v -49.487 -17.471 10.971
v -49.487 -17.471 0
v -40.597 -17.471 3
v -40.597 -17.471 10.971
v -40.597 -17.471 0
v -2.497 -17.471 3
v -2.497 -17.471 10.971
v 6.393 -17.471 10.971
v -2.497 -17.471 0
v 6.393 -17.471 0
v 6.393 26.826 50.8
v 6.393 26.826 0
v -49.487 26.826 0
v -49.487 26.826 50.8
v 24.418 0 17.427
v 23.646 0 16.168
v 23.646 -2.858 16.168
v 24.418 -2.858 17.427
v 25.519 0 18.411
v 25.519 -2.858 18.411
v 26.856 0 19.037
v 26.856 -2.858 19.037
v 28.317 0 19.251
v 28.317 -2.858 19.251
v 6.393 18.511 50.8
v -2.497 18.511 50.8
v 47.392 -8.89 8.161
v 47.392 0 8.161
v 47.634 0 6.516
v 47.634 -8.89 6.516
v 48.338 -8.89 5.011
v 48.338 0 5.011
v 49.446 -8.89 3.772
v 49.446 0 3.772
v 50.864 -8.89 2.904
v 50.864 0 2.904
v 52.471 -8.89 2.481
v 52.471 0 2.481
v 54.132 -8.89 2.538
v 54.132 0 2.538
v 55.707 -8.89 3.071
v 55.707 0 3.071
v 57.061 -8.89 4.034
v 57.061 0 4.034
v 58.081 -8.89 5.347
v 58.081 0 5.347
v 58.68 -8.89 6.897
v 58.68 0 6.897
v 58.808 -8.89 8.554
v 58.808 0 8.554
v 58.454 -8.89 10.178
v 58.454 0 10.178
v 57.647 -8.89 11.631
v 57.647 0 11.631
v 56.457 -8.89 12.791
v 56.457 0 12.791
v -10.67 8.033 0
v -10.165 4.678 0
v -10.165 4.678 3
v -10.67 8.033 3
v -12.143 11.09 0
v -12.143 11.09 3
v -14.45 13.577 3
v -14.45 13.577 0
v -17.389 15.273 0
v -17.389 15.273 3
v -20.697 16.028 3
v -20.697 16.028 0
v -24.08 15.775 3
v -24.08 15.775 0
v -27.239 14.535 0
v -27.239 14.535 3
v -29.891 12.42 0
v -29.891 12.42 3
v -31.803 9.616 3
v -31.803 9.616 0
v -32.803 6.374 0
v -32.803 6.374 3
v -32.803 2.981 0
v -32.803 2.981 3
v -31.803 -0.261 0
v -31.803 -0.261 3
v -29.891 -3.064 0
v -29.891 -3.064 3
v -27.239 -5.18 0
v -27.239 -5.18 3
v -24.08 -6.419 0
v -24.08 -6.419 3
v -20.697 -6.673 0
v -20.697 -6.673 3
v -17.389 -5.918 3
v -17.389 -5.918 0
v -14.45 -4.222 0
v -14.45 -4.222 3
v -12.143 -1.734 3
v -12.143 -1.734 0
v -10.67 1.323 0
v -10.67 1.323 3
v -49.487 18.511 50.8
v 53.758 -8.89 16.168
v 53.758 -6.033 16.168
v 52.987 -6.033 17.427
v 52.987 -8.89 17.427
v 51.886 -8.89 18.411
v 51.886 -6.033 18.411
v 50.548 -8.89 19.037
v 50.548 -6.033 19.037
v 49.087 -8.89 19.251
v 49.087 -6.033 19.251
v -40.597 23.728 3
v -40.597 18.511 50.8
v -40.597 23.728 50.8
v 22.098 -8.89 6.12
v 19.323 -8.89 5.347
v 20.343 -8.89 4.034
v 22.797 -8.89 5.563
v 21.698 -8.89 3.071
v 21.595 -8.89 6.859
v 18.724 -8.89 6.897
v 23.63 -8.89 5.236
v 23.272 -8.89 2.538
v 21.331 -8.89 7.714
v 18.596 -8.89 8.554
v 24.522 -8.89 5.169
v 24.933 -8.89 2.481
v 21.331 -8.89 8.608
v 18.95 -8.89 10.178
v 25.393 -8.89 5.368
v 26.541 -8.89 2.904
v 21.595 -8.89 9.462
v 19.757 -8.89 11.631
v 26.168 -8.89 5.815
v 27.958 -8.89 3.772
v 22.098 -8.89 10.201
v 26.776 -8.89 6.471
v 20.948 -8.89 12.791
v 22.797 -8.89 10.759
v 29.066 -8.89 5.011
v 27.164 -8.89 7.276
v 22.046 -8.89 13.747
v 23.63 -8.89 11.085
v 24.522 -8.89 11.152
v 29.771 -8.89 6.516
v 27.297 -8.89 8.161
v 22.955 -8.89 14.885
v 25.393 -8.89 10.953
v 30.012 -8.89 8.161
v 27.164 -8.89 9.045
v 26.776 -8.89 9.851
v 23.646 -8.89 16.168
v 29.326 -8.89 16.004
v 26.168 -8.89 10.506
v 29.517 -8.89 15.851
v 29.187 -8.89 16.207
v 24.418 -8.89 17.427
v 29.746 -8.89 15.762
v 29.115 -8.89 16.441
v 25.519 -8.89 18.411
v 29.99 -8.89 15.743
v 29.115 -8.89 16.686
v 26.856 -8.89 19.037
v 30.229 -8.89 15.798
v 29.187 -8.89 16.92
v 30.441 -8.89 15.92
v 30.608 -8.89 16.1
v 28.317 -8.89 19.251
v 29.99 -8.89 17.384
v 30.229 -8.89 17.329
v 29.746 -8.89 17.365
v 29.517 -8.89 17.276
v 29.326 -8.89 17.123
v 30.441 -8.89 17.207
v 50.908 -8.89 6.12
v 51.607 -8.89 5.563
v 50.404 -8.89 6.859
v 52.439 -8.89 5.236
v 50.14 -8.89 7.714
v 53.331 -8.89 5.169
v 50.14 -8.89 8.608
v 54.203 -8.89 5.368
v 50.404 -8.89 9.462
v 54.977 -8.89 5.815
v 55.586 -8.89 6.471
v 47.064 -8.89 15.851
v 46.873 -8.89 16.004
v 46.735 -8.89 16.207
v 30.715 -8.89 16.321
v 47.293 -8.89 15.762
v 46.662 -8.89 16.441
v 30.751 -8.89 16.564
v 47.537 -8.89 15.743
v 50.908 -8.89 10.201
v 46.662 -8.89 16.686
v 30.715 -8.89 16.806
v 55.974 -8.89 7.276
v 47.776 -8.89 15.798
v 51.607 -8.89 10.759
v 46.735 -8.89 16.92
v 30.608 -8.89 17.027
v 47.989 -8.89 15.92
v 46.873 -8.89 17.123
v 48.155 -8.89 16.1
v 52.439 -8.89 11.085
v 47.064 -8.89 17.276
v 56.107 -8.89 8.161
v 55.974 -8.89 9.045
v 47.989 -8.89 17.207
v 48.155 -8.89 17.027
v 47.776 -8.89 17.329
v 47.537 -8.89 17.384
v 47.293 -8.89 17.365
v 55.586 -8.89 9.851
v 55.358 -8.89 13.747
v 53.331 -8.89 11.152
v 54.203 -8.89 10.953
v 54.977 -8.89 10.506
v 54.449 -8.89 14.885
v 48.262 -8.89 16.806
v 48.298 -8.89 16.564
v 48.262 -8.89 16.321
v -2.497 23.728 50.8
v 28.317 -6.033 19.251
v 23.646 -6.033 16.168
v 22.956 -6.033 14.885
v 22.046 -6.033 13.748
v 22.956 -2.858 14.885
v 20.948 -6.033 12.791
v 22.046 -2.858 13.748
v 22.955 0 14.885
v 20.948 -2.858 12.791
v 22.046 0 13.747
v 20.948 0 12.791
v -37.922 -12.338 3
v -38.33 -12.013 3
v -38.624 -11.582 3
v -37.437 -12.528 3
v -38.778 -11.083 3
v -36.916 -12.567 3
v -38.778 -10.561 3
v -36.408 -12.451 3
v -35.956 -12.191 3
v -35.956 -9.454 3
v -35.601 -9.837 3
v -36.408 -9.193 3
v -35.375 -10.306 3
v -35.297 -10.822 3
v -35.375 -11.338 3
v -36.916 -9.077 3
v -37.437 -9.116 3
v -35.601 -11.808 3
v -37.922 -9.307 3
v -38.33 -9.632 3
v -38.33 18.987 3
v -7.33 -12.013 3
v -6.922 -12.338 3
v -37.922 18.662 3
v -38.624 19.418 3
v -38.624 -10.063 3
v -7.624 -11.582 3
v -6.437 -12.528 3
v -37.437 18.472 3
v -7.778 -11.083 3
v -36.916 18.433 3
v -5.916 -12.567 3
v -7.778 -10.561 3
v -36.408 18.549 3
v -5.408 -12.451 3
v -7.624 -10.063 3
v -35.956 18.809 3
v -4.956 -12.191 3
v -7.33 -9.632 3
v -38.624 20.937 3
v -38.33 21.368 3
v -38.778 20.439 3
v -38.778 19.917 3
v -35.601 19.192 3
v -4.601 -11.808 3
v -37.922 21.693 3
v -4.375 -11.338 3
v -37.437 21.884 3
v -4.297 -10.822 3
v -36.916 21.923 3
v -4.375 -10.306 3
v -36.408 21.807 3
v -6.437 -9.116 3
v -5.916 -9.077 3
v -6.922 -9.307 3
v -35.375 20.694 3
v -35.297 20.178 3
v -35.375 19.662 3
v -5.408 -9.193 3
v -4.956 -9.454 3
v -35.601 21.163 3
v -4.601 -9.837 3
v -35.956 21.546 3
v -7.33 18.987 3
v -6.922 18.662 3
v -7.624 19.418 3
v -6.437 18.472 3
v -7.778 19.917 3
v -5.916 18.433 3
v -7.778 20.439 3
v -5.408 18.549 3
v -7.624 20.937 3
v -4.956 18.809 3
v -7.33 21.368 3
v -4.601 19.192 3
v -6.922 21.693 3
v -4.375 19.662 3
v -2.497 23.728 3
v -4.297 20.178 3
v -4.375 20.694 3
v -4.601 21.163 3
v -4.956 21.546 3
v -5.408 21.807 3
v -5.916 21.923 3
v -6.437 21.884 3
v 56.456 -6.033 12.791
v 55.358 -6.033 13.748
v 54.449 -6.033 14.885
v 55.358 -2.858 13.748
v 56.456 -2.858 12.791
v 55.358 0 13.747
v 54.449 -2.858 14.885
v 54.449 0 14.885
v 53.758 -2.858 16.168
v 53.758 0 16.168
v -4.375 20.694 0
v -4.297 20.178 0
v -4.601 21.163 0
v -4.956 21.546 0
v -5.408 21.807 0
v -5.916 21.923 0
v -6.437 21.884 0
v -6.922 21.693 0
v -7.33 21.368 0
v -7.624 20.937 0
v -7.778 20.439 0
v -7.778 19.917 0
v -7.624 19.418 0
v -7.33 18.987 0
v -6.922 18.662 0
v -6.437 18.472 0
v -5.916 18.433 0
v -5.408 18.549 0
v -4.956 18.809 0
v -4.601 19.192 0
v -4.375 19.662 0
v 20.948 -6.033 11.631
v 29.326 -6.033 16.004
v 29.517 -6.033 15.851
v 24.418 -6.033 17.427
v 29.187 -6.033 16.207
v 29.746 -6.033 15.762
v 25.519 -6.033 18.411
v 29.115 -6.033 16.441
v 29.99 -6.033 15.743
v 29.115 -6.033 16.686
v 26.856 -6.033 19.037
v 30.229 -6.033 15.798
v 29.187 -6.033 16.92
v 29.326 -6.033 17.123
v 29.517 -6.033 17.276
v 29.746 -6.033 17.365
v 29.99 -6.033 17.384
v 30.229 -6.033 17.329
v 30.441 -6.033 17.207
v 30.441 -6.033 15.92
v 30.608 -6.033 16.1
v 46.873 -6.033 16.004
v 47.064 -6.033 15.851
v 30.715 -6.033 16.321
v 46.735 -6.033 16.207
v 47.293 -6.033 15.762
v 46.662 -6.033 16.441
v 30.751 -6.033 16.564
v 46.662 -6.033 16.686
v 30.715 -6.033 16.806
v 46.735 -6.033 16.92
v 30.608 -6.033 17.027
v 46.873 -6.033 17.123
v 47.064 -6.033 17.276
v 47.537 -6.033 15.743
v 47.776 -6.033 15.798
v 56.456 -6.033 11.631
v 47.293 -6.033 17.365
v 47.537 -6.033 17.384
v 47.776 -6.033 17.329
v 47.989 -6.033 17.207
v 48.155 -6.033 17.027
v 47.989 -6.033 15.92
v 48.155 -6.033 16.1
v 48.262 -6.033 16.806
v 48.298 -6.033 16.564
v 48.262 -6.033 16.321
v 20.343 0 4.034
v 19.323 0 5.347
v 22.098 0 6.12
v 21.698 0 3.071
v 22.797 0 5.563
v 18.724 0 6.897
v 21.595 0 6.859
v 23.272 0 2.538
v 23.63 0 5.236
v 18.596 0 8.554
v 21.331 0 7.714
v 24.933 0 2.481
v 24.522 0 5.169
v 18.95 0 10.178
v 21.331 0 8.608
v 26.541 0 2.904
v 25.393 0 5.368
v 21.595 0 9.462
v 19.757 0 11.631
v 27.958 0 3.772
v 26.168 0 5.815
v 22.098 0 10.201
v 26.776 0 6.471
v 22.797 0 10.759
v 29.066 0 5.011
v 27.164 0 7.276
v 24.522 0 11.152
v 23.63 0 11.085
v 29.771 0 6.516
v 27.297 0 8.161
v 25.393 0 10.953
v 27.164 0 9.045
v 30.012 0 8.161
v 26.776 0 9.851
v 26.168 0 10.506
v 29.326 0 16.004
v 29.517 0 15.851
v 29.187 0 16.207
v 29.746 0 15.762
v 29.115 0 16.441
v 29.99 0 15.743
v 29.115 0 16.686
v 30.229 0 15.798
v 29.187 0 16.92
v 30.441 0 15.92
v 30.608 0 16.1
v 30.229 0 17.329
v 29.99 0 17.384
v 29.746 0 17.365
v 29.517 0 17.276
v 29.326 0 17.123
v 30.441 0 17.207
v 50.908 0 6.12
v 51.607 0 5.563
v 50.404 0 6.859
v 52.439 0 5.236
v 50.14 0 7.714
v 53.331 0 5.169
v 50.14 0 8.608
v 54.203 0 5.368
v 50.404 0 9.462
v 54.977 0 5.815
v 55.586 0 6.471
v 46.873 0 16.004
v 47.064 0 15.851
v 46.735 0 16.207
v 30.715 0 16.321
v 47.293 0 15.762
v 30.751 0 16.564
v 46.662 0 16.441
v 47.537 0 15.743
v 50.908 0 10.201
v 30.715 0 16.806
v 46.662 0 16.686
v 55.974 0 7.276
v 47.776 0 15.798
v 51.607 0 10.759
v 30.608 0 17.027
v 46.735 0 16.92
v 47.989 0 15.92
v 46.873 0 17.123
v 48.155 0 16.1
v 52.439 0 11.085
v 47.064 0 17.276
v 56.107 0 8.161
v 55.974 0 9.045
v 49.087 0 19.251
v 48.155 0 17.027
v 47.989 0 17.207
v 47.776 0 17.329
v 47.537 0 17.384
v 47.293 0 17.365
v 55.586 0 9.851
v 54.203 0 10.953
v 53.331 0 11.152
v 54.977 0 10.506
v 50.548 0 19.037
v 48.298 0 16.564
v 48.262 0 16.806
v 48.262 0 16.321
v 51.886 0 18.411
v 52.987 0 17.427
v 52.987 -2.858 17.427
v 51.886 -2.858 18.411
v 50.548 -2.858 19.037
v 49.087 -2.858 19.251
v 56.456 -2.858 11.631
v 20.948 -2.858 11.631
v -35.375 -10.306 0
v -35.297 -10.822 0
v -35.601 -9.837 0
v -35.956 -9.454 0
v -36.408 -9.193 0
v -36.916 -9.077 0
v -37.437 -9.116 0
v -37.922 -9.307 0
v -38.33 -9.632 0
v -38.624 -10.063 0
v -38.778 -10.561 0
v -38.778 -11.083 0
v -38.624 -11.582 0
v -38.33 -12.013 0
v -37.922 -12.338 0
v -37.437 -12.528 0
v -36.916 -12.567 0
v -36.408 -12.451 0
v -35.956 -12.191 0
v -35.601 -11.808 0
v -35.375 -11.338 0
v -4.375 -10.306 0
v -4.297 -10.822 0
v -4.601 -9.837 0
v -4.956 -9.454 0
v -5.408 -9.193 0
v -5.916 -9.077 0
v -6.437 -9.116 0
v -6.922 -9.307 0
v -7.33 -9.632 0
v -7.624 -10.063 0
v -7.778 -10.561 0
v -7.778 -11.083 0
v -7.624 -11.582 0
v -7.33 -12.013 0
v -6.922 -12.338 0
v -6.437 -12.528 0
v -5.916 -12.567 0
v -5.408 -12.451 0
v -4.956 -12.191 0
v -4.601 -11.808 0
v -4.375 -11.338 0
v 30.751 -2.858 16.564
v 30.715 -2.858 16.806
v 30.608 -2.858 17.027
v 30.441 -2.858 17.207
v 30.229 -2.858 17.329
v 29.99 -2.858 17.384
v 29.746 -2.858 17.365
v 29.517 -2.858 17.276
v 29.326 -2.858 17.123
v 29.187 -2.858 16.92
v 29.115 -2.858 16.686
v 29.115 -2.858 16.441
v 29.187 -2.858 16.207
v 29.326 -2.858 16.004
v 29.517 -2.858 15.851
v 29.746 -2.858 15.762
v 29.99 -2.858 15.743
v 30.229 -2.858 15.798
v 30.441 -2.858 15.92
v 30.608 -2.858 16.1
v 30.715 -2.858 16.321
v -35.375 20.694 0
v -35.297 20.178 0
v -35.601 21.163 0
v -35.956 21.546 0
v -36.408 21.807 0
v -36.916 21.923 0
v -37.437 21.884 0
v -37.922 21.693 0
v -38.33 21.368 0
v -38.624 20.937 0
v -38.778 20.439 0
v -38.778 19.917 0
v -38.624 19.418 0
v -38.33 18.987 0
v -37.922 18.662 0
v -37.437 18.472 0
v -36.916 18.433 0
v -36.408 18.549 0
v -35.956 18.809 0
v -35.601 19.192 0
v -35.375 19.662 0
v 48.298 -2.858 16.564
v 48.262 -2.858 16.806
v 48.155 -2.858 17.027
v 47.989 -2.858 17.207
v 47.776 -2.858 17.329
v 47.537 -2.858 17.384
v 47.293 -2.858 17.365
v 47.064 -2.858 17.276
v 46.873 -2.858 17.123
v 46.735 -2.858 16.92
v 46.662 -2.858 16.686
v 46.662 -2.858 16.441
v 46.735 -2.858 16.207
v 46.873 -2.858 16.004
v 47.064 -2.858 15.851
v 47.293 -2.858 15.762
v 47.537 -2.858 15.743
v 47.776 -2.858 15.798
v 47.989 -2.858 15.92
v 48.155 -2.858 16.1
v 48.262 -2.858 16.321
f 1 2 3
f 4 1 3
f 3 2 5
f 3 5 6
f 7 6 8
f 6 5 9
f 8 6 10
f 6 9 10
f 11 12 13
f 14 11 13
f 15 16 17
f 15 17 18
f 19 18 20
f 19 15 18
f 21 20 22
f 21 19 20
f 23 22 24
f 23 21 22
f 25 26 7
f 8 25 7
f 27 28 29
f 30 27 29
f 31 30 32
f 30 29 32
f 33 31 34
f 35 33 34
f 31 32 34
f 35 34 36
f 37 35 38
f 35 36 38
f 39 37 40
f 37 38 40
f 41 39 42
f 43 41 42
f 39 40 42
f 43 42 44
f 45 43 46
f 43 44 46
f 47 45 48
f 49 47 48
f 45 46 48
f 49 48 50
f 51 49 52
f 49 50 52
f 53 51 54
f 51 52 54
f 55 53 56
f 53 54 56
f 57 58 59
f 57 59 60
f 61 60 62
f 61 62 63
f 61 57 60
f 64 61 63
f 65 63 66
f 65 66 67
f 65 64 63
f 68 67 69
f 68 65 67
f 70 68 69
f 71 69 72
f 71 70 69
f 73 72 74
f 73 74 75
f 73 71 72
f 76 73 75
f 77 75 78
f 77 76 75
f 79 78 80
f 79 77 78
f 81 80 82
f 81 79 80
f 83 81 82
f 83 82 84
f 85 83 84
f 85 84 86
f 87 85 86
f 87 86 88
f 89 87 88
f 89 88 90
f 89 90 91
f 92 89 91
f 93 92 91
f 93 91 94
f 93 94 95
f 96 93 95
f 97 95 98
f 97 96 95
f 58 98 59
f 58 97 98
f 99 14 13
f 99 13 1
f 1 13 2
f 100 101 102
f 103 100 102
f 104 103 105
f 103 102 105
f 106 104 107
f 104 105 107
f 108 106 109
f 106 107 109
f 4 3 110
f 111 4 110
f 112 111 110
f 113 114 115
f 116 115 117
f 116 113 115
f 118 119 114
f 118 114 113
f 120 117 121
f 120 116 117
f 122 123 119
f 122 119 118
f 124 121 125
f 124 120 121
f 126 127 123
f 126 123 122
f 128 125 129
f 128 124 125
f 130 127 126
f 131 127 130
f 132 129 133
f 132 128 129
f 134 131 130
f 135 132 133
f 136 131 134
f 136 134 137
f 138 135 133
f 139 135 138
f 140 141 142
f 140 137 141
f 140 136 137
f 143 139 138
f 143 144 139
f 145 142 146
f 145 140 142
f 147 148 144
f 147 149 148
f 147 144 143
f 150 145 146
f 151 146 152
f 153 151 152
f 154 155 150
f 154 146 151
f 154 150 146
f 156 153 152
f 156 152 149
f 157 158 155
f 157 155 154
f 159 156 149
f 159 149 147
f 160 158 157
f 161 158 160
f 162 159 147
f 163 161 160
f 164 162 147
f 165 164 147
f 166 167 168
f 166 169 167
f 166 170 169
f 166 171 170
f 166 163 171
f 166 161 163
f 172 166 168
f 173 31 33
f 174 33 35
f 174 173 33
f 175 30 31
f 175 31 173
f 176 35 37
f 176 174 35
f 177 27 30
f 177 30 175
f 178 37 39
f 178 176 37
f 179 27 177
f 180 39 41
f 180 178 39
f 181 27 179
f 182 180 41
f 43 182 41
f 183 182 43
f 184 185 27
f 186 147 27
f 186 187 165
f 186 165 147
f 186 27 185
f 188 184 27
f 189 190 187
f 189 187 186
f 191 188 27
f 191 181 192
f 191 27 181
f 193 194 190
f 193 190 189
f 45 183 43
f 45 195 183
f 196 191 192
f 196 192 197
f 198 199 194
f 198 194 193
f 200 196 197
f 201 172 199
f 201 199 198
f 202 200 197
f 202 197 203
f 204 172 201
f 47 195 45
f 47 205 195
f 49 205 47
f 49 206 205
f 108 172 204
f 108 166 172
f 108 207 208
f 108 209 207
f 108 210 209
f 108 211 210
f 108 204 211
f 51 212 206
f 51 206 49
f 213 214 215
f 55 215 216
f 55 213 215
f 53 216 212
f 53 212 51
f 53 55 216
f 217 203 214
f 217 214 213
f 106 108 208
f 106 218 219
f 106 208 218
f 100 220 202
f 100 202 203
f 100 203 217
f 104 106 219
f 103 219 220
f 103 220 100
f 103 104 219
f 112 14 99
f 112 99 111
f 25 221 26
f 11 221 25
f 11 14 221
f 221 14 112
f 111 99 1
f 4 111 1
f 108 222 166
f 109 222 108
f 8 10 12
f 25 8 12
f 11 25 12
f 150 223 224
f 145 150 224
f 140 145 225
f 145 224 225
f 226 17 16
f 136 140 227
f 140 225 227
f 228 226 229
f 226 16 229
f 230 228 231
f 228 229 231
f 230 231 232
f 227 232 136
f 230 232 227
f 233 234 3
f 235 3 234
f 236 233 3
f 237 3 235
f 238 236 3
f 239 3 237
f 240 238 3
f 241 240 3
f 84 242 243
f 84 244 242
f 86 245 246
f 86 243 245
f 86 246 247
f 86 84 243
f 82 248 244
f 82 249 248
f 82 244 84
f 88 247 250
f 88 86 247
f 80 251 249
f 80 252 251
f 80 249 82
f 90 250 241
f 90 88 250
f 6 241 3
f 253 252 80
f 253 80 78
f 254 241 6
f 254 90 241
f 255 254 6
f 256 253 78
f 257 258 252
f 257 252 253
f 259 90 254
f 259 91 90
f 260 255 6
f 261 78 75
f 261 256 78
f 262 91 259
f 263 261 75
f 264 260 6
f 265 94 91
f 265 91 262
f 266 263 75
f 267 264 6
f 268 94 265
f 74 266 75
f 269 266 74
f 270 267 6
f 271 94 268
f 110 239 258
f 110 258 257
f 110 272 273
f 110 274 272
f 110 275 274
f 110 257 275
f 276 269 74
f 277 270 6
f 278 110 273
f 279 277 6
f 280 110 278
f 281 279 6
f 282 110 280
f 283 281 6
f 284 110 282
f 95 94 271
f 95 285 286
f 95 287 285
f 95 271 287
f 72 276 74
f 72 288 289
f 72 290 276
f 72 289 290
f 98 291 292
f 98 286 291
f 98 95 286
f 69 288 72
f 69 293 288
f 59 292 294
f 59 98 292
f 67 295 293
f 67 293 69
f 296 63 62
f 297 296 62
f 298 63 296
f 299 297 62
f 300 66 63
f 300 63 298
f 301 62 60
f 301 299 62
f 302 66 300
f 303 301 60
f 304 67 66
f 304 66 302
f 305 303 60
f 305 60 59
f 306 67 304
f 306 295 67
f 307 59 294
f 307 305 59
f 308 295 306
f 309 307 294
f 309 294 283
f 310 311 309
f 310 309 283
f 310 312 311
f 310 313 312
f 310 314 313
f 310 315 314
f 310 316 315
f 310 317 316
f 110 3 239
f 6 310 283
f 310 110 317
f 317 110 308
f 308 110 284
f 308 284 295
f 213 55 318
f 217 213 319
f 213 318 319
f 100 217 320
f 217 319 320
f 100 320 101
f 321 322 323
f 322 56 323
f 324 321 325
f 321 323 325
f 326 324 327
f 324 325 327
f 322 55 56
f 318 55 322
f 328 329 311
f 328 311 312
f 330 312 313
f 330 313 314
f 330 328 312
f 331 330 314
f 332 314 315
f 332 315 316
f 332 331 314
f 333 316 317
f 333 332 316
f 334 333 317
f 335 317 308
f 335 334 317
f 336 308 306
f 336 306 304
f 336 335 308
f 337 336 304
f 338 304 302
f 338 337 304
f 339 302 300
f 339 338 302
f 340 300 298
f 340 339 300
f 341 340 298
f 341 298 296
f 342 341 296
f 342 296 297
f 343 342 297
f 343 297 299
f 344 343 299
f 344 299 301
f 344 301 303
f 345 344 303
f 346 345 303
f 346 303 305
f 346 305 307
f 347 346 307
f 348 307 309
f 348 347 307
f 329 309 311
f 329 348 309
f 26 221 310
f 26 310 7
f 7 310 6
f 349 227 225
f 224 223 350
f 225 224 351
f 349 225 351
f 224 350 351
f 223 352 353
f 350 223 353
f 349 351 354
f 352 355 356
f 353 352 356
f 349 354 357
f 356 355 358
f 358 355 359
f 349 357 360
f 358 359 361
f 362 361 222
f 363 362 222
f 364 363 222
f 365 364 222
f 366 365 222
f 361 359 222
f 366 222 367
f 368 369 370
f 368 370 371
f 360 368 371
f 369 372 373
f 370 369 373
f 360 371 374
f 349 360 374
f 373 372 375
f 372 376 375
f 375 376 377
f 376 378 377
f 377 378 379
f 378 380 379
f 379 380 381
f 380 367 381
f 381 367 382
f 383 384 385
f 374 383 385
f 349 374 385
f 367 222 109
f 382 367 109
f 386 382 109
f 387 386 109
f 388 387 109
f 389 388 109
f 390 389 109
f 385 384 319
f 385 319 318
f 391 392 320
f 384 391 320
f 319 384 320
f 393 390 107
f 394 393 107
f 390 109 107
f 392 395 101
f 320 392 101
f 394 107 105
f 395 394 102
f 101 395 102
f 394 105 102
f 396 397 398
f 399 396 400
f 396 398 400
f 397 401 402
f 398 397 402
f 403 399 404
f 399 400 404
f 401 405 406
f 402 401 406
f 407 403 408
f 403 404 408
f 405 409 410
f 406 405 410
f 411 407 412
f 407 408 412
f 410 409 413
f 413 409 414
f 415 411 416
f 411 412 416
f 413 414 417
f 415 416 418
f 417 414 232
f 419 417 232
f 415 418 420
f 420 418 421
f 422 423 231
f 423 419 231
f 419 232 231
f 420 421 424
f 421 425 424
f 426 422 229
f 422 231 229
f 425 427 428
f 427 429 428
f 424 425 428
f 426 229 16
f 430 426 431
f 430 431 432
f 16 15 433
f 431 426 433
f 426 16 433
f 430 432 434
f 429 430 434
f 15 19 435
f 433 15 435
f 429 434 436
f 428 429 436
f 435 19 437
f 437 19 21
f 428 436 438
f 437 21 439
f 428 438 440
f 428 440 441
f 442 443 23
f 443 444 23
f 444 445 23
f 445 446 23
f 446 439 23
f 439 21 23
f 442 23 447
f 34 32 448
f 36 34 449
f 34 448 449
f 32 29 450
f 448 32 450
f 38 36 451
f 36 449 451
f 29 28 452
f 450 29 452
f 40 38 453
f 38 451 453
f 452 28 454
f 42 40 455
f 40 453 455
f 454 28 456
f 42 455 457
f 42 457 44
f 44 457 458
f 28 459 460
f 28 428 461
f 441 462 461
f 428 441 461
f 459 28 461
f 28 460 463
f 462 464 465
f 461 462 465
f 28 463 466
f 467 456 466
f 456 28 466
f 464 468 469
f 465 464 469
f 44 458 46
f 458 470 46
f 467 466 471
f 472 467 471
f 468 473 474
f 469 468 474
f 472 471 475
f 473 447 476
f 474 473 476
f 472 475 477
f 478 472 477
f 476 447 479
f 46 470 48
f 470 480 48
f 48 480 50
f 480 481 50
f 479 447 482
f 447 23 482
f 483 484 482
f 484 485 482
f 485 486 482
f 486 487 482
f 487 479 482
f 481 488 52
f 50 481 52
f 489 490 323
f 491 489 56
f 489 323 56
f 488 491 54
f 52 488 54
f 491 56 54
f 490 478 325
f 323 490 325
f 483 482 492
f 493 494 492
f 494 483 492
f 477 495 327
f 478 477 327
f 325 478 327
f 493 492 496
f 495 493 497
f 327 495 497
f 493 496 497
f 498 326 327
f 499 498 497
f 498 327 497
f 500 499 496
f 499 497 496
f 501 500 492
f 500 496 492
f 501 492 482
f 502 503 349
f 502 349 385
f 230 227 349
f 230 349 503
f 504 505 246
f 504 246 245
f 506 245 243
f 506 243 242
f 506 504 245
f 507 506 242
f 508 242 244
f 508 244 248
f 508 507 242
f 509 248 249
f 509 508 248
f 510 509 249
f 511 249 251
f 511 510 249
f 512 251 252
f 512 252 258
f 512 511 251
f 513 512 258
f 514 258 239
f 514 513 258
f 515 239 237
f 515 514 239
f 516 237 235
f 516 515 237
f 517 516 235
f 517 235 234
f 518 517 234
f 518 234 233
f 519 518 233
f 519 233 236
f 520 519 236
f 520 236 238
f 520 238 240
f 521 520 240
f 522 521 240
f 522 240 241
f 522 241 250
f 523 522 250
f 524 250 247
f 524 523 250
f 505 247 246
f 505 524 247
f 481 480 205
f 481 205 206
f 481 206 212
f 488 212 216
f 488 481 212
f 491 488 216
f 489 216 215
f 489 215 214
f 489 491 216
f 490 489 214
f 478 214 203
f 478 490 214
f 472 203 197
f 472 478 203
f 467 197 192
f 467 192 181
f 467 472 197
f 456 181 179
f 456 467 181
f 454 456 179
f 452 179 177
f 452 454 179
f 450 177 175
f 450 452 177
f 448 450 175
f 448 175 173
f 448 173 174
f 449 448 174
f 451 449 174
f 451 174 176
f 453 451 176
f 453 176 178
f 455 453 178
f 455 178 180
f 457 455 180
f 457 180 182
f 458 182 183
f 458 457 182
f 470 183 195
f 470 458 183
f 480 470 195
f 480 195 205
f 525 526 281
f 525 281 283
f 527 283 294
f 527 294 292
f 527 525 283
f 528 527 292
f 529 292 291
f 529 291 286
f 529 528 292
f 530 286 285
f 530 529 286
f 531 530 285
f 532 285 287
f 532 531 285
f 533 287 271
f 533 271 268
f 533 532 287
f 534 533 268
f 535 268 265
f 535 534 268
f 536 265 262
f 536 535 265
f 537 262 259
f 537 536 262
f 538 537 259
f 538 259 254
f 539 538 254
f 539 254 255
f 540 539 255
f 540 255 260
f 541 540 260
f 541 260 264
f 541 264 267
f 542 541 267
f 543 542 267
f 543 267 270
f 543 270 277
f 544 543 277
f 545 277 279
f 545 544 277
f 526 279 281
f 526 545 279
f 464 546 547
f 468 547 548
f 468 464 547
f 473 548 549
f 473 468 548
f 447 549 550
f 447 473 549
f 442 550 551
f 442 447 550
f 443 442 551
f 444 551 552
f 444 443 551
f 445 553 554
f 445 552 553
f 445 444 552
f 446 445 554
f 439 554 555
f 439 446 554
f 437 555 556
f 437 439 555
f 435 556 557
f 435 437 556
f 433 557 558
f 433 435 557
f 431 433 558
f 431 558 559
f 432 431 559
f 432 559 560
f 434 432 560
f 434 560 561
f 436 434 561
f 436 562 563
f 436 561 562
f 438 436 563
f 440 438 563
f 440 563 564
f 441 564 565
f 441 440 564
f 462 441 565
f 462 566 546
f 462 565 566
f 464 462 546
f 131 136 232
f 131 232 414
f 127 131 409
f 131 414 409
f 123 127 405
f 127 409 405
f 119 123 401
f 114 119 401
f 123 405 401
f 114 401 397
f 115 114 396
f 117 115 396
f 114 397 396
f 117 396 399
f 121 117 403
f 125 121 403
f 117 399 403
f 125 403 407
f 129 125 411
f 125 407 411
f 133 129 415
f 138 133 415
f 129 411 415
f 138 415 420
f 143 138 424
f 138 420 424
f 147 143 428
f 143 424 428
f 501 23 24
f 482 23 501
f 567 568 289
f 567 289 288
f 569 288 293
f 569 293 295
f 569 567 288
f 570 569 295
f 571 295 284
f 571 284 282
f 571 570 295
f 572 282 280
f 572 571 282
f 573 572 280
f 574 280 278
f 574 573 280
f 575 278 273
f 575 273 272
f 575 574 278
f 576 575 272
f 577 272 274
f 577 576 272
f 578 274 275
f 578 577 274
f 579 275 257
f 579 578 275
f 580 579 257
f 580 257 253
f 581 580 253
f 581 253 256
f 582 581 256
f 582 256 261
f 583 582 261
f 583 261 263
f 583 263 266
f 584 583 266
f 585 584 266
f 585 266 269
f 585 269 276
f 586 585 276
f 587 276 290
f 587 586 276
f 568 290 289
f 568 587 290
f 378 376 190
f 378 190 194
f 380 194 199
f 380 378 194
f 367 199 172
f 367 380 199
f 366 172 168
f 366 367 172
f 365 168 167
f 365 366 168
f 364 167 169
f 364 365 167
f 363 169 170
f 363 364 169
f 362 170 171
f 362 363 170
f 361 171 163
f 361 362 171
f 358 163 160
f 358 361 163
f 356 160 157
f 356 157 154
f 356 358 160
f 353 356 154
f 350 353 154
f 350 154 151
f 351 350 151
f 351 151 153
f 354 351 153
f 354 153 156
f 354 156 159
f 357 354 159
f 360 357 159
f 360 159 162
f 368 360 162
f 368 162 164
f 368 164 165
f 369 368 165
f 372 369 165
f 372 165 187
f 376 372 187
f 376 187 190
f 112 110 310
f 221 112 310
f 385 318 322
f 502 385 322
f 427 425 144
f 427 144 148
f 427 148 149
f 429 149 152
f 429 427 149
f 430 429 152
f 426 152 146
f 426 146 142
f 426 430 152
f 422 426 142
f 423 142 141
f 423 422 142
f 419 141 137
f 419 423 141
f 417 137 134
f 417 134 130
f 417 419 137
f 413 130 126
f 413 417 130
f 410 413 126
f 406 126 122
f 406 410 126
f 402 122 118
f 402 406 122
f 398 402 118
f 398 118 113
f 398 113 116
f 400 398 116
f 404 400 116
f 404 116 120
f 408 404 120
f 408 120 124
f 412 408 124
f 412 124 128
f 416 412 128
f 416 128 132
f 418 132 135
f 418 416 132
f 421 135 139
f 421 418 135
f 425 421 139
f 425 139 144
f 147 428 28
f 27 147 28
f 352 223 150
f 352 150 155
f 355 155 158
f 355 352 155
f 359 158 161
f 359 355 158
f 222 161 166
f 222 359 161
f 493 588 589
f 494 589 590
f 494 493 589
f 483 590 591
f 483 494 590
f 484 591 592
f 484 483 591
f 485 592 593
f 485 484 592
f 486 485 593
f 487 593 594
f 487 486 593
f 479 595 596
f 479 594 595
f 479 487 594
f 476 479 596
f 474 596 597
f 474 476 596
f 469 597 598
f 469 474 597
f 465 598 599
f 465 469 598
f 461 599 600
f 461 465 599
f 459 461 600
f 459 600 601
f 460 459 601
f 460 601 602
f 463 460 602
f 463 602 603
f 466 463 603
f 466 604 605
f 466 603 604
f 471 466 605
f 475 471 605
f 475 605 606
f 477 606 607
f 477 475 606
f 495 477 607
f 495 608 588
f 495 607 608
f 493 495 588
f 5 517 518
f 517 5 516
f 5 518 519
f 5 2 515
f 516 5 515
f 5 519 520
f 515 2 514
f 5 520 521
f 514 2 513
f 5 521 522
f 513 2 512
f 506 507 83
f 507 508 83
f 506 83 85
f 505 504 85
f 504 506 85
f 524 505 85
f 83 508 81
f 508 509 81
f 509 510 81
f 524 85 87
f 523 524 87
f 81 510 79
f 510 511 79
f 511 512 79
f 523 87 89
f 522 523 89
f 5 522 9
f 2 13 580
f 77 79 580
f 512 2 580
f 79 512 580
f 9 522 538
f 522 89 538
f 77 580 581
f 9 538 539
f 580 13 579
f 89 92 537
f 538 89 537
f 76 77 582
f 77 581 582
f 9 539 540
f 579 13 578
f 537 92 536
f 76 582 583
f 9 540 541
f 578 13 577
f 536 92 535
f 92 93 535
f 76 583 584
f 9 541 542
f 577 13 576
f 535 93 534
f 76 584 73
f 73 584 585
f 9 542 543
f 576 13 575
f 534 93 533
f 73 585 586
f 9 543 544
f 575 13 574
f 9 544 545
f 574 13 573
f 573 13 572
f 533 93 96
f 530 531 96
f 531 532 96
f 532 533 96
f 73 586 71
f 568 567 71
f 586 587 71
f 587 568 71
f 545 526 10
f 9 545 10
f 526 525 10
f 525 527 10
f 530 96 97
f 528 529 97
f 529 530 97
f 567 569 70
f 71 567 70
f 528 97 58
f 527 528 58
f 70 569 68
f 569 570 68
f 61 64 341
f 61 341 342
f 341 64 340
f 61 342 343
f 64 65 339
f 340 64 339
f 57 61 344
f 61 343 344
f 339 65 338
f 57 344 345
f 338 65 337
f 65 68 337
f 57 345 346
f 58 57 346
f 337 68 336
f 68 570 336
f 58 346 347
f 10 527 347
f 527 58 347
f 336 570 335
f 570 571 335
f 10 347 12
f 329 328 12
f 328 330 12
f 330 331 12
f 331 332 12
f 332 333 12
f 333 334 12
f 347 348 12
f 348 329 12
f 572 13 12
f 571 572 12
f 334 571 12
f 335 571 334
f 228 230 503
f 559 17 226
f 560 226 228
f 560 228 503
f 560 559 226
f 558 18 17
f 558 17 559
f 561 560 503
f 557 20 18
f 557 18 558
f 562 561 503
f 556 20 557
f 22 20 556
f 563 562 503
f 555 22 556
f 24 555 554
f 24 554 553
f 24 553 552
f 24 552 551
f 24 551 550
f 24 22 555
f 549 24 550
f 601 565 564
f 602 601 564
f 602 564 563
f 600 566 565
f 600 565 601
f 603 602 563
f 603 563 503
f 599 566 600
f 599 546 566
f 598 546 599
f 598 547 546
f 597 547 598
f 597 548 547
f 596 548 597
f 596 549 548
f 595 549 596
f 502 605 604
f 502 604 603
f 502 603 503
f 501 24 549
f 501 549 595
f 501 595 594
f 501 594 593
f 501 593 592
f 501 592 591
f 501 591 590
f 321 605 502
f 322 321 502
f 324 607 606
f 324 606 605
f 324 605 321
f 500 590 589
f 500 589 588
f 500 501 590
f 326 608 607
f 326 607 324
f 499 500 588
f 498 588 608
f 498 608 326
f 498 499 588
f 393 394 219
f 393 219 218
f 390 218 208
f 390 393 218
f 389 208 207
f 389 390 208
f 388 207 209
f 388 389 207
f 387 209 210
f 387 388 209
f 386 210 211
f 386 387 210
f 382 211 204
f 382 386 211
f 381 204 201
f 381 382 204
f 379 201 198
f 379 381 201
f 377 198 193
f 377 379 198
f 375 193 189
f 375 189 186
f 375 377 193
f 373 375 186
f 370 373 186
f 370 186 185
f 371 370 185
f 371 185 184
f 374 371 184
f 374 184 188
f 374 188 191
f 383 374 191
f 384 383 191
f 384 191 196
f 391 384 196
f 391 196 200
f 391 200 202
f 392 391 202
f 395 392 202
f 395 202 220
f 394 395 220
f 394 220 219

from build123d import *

# Parameters (mm, degrees)
F0_W        = 38.1
F0_H        = 38.1
F0_R        = 1.75
F0_R_2      = 11.3825570241
F0_H_2      = 3.0987125382
F1_DEPTH    = 3
F2_DEPTH    = 50.8
F4_DEPTH    = 55.88
F5_R        = 3
F5_R_2      = 0.8225607068
F6_DEPTH    = 8.89
F7_T4_DEPTH = 8.89
F7_T9_DEPTH = 8.89
F8_R        = 5.08
F9_W        = 35.5085759405
F9_H        = 3.175
F10_DEPTH   = 7.62


# Not quite as in the source:
# - a fillet or chamfer that OpenCascade refuses, or shapes differently, is made with other operations: its cross-section is extruded or revolved along the edge and cut away or added


with BuildPart() as f1:
    # F0 (on Top) → F1 (new body)
    with BuildSketch(Plane.XY):
        with Locations((-21.547248587, 4.677680321)):
            Rectangle(F0_W, F0_H)
        with Locations((-37.047248587, -10.822319679)):
            Circle(F0_R, mode=Mode.SUBTRACT)
        with Locations((-6.047248587, -10.822319679)):
            Circle(F0_R, mode=Mode.SUBTRACT)
        with Locations((-37.047248587, 20.177680321)):
            Circle(F0_R, mode=Mode.SUBTRACT)
        with Locations((-21.547248587, 4.677680321)):
            Circle(F0_R_2, mode=Mode.SUBTRACT)
        with Locations((-6.047248587, 20.177680321)):
            Circle(F0_R, mode=Mode.SUBTRACT)
        with Locations((-21.547248587, -15.9216759481)):
            Rectangle(F0_W, F0_H_2)
    extrude(amount=F1_DEPTH)

    # F0 (on Top) → F2 (join)
    with BuildSketch(Plane.XY):
        Polygon((-2.497248587, 23.727680321), (-2.497248587, -14.372319679), (-2.497248587, -17.4710322171), (6.392751413, -17.4710322171), (6.392751413, 26.8263928592), (-49.487248587, 26.8263928592), (-49.487248587, -17.4710322171), (-40.597248587, -17.4710322171), (-40.597248587, -14.372319679), (-40.597248587, 23.727680321), align=None)
    extrude(amount=F2_DEPTH)

    # F3 (on face) → F4 (cut, through all)
    with BuildSketch(Plane(origin=(-49.487248587, 0, 0), x_dir=(0, -1, 0), z_dir=(-1, 0, 0))):
        Polygon((17.4710322171, 50.8), (-18.5107886791, 50.8), (17.4710322171, 10.9709706157), align=None)
    extrude(amount=-F4_DEPTH, mode=Mode.SUBTRACT)


with BuildPart() as f6:
    # F5 (on Front) → F6 (new body)
    with BuildSketch(Plane.XZ):
        with BuildLine():
            Line((24.2974720895, 19.2513801157), (24.2974720895, 13.8756283784))
            ThreePointArc((24.2974720895, 13.8756283784), (20.256356835, 4.1195131239), (30.0124720895, 8.1606283784))
            Line((30.0124720895, 8.1606283784), (47.3918369746, 8.1606283784))
            ThreePointArc((47.3918369746, 8.1606283784), (57.1479522291, 4.1195131239), (53.1068369746, 13.8756283784))
            Line((53.1068369746, 13.8756283784), (53.1068369746, 19.2513801157))
            Line((53.1068369746, 19.2513801157), (24.2974720895, 19.2513801157))
        make_face()
        with Locations((24.2974720895, 8.1606283784)):
            Circle(F5_R, mode=Mode.SUBTRACT)
        with Locations((53.1068369746, 8.1606283784)):
            Circle(F5_R, mode=Mode.SUBTRACT)
        with Locations((29.9285501242, 16.5635042471)):
            Circle(F5_R_2, mode=Mode.SUBTRACT)
        with Locations((47.47575894, 16.5635042471)):
            Circle(F5_R_2, mode=Mode.SUBTRACT)
    extrude(amount=F6_DEPTH)

    # F7: fillet of radius 8.0943752319 on 2 edges, made by hand


with BuildPart() as f7_tool2:
    # F7_s3 → F7_t4 (new body)
    with BuildSketch(Plane.XZ):
        with BuildLine():
            ThreePointArc((24.2974720895, 19.3490122608), (23.4115248028, 15.6669643315), (20.947620726, 12.790932995))
            ThreePointArc((20.947620726, 12.790932995), (22.536927555, 13.5976963329), (24.2974720895, 13.8756283784))
            Line((24.2974720895, 13.8756283784), (24.2974720895, 19.3490122608))
        make_face()
    extrude(amount=F7_T4_DEPTH)

    split(bisect_by=Plane.XY.offset(19.2513801157), keep=Keep.BOTTOM)


with BuildPart() as f6_1:
    add(f6.part)

    # F7_t1: union F7_tool2
    add(f7_tool2.part)


with BuildPart() as f7_tool7:
    # F7_s8 → F7_t9 (new body)
    with BuildSketch(Plane.XZ):
        with BuildLine():
            ThreePointArc((56.4566883382, 12.790932995), (53.9927842613, 15.6669643315), (53.1068369746, 19.3490122608))
            Line((53.1068369746, 19.3490122608), (53.1068369746, 13.8756283784))
            ThreePointArc((53.1068369746, 13.8756283784), (54.8673815092, 13.5976963329), (56.4566883382, 12.790932995))
        make_face()
    extrude(amount=F7_T9_DEPTH)

    split(bisect_by=Plane.XY.offset(19.2513801157), keep=Keep.BOTTOM)


with BuildPart() as f6_2:
    add(f6_1.part)

    # F7_t6: union F7_tool7
    add(f7_tool7.part)

    # F8
    f8_edges = [f6_2.edges().sort_by_distance(p)[0] for p in [
        (24.296883, -4.445, 19.25138),
        (53.107426, -4.445, 19.25138),
    ]]
    fillet(f8_edges, radius=F8_R)

    # F9 (on face) → F10 (cut)
    with BuildSketch(Plane.XY.offset(19.2513801157)):
        with Locations((38.7021545321, -4.445)):
            Rectangle(F9_W, F9_H)
    extrude(amount=-F10_DEPTH, mode=Mode.SUBTRACT)


solid = Compound([f1.part, f6_2.part])
